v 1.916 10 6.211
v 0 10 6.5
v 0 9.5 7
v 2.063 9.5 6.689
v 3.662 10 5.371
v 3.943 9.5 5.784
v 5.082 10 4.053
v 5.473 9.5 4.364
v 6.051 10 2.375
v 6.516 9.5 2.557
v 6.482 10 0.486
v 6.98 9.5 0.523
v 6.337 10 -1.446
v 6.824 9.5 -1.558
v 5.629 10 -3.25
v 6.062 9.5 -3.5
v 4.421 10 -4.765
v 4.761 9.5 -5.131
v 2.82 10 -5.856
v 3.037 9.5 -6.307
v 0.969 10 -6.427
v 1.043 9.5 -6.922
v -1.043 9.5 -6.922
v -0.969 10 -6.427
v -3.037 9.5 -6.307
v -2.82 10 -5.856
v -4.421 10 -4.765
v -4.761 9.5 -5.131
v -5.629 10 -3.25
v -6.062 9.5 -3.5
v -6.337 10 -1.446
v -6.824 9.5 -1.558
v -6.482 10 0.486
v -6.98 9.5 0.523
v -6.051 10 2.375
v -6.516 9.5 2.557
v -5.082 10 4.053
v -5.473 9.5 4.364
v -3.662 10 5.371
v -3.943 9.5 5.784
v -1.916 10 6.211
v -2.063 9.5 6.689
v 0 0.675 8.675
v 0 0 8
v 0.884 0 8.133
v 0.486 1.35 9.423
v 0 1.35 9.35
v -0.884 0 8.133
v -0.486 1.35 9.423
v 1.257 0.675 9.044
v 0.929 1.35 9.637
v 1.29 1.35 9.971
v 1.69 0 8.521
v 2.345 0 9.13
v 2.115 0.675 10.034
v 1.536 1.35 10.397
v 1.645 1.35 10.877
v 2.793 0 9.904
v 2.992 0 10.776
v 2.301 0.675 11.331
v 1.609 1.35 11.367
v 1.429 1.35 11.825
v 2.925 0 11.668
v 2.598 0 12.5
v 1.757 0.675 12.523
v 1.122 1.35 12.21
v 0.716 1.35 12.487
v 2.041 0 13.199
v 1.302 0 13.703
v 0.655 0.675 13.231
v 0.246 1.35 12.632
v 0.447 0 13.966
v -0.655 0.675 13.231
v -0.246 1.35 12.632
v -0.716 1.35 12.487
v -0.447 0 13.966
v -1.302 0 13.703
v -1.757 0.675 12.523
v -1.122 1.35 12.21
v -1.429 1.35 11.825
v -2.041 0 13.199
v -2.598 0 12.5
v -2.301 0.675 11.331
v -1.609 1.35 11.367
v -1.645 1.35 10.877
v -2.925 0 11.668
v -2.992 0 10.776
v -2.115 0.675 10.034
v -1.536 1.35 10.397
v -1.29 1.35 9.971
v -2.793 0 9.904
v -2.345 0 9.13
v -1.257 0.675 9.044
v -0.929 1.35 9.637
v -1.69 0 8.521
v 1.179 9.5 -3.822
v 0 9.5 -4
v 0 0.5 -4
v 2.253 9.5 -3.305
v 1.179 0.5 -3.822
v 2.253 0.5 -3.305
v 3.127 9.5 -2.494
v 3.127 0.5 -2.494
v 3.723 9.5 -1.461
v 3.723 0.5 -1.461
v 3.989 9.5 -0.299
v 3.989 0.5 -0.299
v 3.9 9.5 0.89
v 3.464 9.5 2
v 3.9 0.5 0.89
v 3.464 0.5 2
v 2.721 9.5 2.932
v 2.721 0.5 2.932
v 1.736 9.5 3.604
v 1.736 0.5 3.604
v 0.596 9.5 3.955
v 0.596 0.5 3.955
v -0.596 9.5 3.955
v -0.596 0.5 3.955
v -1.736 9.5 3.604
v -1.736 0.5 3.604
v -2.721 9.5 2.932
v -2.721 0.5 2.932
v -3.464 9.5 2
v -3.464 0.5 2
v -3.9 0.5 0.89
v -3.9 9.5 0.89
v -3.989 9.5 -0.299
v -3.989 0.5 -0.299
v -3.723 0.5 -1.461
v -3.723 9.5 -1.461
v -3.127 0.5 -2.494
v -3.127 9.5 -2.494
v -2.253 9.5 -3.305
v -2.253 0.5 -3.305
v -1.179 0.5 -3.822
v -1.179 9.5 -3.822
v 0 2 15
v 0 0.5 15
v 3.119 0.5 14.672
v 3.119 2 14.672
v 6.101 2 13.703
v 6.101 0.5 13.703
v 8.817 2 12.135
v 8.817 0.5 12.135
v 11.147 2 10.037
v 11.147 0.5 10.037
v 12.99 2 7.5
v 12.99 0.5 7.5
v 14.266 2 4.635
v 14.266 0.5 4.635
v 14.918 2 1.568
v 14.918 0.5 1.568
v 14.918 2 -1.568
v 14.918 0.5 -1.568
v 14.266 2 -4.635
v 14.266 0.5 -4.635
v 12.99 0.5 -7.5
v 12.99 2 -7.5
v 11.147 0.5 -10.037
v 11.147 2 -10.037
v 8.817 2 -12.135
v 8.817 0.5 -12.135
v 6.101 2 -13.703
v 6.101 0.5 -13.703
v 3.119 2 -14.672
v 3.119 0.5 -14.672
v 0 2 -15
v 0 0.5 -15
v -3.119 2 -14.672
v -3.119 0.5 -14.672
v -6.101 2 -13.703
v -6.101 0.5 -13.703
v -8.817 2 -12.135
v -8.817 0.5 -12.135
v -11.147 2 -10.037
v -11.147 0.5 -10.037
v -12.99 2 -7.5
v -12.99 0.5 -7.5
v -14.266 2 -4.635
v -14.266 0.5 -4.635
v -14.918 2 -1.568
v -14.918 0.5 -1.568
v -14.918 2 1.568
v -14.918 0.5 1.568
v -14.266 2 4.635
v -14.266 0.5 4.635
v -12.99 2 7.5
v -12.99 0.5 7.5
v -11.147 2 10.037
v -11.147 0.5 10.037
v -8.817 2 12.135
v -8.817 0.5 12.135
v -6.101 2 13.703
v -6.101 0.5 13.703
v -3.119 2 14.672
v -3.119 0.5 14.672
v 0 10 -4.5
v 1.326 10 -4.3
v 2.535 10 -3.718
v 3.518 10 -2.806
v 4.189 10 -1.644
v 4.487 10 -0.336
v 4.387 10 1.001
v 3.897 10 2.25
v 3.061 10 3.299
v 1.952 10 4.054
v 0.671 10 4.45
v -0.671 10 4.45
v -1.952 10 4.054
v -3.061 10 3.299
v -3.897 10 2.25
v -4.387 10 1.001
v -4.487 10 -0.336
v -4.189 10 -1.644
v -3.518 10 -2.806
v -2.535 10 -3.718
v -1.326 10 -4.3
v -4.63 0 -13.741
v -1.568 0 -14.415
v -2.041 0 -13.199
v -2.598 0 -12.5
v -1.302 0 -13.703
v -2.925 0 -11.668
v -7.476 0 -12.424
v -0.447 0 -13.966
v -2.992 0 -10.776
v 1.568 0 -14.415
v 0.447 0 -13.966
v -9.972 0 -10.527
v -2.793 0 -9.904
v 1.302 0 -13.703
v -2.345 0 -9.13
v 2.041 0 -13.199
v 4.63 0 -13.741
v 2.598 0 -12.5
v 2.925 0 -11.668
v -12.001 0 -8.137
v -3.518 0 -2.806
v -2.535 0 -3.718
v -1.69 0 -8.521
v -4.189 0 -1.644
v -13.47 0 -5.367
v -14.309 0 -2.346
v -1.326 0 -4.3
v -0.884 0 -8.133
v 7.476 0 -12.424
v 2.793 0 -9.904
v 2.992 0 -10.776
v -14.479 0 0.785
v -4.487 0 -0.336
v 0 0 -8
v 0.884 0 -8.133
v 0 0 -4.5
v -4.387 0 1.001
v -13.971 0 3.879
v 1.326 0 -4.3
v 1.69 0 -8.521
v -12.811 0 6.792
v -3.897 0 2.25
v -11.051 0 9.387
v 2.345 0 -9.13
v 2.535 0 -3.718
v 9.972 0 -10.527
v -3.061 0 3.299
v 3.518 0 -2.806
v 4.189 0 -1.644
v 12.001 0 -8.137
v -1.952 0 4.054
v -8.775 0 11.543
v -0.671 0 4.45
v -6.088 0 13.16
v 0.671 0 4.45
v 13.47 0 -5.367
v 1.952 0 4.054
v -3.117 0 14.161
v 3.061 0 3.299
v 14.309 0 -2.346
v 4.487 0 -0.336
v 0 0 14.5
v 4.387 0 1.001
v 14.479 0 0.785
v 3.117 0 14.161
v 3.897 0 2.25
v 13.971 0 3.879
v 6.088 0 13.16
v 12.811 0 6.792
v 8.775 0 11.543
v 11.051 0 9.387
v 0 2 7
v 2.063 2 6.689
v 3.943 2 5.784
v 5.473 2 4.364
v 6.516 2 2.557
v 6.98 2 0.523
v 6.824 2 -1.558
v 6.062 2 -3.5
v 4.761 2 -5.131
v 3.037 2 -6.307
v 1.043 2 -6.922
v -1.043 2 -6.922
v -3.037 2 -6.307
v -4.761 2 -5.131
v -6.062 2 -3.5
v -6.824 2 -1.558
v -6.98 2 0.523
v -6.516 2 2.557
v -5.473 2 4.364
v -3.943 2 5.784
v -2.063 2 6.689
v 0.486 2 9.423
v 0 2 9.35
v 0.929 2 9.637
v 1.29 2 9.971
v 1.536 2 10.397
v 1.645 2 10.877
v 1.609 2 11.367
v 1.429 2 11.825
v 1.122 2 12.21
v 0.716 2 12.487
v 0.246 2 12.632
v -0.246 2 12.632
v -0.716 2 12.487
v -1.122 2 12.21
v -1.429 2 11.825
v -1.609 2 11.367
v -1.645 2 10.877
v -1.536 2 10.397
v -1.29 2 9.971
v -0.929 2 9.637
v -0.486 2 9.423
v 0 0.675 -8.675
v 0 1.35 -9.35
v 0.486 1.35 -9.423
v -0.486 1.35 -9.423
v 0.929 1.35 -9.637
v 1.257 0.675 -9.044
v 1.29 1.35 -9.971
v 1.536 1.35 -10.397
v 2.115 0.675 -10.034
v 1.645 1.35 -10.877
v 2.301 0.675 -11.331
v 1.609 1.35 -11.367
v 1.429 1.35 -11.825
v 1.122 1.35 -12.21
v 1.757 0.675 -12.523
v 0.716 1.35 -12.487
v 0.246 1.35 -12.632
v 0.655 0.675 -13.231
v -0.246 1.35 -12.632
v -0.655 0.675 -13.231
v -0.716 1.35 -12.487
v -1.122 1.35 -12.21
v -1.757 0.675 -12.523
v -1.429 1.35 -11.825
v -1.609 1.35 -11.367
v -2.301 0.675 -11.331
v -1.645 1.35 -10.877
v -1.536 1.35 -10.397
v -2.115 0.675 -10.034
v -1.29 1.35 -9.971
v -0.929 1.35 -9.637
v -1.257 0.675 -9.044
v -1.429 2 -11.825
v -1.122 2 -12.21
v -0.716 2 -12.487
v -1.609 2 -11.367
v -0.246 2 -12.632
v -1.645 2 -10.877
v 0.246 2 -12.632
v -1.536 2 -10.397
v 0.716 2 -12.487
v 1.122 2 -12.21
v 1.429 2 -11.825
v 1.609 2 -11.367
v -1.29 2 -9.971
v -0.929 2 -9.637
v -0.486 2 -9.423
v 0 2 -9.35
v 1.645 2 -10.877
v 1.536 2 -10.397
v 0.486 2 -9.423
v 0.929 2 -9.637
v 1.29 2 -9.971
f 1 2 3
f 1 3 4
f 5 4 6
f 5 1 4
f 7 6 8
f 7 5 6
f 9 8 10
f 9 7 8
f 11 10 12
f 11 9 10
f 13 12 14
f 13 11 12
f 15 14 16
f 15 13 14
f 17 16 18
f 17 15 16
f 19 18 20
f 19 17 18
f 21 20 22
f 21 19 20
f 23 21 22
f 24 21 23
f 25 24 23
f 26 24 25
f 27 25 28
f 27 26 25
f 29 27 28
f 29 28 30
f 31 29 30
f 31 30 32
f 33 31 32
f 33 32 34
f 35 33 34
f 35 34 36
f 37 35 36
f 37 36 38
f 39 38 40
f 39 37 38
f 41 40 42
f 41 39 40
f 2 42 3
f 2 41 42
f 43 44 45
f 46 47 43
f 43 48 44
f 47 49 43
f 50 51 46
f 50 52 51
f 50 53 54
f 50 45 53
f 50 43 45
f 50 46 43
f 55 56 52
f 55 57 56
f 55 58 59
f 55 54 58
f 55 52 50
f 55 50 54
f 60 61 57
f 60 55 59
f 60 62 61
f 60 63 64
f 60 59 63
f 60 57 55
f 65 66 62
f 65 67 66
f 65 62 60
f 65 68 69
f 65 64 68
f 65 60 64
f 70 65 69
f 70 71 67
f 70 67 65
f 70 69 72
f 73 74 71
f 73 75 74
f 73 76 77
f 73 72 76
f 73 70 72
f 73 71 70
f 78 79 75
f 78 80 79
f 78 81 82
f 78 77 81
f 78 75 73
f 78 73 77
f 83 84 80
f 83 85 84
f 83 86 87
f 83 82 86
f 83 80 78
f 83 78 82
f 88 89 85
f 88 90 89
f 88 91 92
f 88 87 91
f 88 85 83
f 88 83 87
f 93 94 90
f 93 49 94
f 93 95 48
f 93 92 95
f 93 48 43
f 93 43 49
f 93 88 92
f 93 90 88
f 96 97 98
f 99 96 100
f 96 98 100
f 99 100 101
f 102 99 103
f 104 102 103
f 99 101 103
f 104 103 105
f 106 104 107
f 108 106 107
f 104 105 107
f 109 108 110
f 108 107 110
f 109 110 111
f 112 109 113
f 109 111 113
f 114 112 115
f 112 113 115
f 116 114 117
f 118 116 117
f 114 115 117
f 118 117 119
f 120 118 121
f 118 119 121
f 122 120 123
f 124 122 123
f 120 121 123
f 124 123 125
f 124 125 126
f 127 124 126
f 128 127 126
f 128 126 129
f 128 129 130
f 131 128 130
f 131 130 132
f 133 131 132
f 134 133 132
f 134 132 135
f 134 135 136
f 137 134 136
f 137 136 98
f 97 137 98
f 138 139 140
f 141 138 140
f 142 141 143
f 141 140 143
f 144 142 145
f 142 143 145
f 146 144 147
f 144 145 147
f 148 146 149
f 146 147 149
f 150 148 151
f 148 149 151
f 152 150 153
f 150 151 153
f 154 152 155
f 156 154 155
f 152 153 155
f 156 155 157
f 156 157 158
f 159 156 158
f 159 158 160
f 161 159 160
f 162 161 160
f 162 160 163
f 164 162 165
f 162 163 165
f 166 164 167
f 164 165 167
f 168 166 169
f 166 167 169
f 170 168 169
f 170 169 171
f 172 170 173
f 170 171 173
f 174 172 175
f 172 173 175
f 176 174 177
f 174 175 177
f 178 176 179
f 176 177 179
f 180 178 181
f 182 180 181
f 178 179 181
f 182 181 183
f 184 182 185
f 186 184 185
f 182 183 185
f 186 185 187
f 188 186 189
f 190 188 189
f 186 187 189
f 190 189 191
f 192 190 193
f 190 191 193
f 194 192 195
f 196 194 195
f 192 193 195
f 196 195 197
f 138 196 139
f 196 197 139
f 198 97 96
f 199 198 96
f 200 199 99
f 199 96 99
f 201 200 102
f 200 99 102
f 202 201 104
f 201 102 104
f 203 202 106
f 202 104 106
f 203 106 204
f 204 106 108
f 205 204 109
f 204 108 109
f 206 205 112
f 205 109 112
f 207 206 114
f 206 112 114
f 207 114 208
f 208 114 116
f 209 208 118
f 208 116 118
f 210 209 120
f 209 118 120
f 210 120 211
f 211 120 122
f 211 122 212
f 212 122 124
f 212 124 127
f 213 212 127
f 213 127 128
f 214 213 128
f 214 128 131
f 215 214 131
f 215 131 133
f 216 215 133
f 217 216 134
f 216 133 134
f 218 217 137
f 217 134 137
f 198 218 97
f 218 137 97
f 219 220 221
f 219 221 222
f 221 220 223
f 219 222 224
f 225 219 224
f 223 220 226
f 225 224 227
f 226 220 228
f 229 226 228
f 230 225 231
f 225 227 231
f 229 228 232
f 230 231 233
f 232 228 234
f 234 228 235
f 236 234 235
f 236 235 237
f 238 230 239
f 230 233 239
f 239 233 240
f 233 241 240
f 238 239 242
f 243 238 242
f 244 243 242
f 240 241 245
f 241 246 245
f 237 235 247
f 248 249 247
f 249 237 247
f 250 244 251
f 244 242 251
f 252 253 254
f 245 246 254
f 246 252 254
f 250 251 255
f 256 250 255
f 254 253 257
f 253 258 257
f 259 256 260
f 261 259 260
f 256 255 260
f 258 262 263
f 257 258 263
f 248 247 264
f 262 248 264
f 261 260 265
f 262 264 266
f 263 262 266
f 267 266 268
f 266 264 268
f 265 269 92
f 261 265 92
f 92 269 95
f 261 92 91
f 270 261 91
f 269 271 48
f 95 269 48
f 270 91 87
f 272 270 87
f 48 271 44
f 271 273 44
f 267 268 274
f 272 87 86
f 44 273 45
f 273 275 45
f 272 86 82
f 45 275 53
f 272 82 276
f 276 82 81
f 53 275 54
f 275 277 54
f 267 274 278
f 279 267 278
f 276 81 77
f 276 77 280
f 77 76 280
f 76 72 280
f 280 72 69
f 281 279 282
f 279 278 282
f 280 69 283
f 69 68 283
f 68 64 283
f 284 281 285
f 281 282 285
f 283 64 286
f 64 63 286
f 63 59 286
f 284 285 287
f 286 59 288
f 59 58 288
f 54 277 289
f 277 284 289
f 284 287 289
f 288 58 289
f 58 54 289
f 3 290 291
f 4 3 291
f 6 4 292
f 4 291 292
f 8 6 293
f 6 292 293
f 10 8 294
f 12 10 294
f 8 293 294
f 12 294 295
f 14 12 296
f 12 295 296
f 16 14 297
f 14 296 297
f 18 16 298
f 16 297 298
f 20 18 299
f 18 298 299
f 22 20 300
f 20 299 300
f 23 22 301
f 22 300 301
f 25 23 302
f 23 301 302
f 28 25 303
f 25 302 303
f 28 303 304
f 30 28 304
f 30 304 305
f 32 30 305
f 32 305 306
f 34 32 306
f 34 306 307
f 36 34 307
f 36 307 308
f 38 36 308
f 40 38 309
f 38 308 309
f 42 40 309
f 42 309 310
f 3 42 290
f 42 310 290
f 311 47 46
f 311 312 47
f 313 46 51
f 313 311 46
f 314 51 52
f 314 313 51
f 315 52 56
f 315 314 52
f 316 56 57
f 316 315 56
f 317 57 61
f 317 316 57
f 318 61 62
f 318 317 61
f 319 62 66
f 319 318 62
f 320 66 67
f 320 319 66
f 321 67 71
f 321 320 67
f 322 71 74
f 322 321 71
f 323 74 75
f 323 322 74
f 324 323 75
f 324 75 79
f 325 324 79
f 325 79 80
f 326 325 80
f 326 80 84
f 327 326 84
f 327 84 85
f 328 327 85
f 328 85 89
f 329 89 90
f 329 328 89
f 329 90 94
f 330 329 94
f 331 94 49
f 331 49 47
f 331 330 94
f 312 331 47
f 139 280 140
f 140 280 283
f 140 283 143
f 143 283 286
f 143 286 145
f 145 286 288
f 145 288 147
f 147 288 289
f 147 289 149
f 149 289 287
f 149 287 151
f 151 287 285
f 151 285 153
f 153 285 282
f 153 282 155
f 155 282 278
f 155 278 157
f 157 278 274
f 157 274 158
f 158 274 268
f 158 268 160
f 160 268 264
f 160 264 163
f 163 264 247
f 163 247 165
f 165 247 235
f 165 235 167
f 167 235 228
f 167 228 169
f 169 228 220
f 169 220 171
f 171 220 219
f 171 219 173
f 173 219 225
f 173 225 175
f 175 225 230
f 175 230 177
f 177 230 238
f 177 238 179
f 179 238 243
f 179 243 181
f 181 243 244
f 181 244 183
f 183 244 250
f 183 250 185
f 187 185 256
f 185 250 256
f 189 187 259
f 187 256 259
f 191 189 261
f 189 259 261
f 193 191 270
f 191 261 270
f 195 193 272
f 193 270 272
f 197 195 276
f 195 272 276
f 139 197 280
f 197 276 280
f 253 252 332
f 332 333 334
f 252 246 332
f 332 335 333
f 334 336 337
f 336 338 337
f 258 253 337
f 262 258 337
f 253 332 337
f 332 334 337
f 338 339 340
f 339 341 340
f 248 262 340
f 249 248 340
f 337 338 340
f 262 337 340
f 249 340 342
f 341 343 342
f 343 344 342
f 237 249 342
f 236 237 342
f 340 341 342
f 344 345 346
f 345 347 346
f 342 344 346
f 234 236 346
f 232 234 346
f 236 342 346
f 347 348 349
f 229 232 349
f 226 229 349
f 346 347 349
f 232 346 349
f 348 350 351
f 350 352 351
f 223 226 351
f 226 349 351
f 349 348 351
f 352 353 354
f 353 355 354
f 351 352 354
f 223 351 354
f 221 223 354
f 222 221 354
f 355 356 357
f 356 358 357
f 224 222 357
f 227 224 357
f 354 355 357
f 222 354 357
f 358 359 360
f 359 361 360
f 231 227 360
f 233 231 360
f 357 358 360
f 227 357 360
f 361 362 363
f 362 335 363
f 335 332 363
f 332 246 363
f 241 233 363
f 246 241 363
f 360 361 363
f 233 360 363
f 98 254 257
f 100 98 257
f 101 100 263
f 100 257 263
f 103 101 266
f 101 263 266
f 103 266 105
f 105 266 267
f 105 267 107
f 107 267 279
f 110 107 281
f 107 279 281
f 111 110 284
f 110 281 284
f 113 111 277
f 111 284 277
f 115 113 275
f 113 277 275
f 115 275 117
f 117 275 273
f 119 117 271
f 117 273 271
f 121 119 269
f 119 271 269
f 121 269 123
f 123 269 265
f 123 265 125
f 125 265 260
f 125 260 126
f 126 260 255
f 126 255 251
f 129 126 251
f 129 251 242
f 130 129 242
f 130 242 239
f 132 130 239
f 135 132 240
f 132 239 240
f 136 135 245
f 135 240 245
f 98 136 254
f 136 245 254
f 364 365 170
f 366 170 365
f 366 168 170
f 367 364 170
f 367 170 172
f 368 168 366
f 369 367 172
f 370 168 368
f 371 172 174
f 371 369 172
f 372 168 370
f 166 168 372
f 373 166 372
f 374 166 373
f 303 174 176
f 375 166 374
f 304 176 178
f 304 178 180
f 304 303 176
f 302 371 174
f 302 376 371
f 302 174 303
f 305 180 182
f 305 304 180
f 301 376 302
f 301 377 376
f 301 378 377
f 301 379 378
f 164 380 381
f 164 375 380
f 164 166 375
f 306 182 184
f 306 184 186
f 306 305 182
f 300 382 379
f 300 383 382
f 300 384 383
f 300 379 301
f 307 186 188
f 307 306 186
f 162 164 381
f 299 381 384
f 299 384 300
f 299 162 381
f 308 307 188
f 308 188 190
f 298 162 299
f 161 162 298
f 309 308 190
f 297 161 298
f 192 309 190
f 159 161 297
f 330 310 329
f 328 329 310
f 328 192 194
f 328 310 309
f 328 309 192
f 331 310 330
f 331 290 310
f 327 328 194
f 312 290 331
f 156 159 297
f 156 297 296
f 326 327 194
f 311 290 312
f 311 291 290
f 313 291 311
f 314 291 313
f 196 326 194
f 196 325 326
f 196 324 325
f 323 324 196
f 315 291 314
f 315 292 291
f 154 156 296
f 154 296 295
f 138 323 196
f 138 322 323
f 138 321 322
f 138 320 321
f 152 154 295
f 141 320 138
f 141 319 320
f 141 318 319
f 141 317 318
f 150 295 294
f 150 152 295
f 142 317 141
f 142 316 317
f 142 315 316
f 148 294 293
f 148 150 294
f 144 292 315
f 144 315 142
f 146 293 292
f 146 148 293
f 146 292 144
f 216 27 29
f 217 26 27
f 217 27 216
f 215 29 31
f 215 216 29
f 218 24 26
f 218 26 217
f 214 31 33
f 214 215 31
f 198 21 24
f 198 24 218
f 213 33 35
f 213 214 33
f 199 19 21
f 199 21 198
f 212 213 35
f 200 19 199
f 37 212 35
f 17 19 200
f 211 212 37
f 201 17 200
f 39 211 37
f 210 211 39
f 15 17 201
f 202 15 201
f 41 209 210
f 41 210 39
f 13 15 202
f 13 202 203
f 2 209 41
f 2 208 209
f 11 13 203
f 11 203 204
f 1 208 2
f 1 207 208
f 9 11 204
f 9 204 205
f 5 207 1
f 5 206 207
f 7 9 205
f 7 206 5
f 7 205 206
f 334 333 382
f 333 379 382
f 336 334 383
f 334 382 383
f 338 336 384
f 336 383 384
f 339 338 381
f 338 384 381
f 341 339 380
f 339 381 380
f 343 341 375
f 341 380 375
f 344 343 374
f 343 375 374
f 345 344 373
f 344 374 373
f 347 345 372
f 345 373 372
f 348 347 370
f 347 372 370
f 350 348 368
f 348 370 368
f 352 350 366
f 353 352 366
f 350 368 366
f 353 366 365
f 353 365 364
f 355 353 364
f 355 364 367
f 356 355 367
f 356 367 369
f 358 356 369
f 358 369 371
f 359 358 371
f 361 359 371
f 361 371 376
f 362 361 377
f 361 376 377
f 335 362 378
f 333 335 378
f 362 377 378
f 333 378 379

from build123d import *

# Parameters (mm, degrees)
SKETCH_1_R                   = 15
EXTRUDE_1_DEPTH              = 2
SKETCH_2_R                   = 7
EXTRUDE_2_DEPTH              = 8
F_8_0MM_1_D                  = 8
HOLE_WIZARD_M6_1_D           = 3.3
HOLE_WIZARD_M6_1_CSINK_D     = 6
HOLE_WIZARD_M6_1_CSINK_ANGLE = 90
CHAMFER_1_SIZE               = 0.5


with BuildPart() as part:
    # 草图1 → 凸台-拉伸1 (new body)
    with BuildSketch(Plane(origin=(0, 0, 0), x_dir=(1, 0, 0), z_dir=(0, 1, 0))):
        with Locations(Location((0, 0, 0), (0, 0, 270))):
            Circle(SKETCH_1_R)
    extrude(amount=EXTRUDE_1_DEPTH)

    # 草图2 → 凸台-拉伸2 (add)
    with BuildSketch(Plane(origin=(0, 2, 0), x_dir=(1, 0, 0), z_dir=(0, 1, 0))):
        with Locations(Location((0, 0, 0), (0, 0, 270))):
            Circle(SKETCH_2_R)
    extrude(amount=EXTRUDE_2_DEPTH)

    # Ø8.0mm 暗销孔1 (through all)
    with Locations(Plane.ZX.offset(10)):
        with Locations((0, 0)):
            Hole(F_8_0MM_1_D / 2)

    # M6 内六角花形半沉头螺钉的锥形沉头孔1 (through all)
    with Locations(Plane(origin=(0, 0, -11), x_dir=(0, 0, -1), z_dir=(0, -1, 0))):
        with Locations((0, 0)):
            hole_wizard_m6_1 = CounterSinkHole(HOLE_WIZARD_M6_1_D / 2, HOLE_WIZARD_M6_1_CSINK_D / 2, counter_sink_angle=HOLE_WIZARD_M6_1_CSINK_ANGLE)

    # 镜向1: M6 内六角花形半沉头螺钉的锥形沉头孔1 across plane
    add(hole_wizard_m6_1.mirror(Plane.XY), mode=Mode.SUBTRACT)

    # 倒角1
    chamfer_1_edges = [part.edges().sort_by_distance(p)[0] for p in [
        (0, 10, 4),
        (0, 0, 4),
        (0, 0, -15),
        (0, 10, -7),
    ]]
    chamfer(chamfer_1_edges, length=CHAMFER_1_SIZE)


solid = part.part
